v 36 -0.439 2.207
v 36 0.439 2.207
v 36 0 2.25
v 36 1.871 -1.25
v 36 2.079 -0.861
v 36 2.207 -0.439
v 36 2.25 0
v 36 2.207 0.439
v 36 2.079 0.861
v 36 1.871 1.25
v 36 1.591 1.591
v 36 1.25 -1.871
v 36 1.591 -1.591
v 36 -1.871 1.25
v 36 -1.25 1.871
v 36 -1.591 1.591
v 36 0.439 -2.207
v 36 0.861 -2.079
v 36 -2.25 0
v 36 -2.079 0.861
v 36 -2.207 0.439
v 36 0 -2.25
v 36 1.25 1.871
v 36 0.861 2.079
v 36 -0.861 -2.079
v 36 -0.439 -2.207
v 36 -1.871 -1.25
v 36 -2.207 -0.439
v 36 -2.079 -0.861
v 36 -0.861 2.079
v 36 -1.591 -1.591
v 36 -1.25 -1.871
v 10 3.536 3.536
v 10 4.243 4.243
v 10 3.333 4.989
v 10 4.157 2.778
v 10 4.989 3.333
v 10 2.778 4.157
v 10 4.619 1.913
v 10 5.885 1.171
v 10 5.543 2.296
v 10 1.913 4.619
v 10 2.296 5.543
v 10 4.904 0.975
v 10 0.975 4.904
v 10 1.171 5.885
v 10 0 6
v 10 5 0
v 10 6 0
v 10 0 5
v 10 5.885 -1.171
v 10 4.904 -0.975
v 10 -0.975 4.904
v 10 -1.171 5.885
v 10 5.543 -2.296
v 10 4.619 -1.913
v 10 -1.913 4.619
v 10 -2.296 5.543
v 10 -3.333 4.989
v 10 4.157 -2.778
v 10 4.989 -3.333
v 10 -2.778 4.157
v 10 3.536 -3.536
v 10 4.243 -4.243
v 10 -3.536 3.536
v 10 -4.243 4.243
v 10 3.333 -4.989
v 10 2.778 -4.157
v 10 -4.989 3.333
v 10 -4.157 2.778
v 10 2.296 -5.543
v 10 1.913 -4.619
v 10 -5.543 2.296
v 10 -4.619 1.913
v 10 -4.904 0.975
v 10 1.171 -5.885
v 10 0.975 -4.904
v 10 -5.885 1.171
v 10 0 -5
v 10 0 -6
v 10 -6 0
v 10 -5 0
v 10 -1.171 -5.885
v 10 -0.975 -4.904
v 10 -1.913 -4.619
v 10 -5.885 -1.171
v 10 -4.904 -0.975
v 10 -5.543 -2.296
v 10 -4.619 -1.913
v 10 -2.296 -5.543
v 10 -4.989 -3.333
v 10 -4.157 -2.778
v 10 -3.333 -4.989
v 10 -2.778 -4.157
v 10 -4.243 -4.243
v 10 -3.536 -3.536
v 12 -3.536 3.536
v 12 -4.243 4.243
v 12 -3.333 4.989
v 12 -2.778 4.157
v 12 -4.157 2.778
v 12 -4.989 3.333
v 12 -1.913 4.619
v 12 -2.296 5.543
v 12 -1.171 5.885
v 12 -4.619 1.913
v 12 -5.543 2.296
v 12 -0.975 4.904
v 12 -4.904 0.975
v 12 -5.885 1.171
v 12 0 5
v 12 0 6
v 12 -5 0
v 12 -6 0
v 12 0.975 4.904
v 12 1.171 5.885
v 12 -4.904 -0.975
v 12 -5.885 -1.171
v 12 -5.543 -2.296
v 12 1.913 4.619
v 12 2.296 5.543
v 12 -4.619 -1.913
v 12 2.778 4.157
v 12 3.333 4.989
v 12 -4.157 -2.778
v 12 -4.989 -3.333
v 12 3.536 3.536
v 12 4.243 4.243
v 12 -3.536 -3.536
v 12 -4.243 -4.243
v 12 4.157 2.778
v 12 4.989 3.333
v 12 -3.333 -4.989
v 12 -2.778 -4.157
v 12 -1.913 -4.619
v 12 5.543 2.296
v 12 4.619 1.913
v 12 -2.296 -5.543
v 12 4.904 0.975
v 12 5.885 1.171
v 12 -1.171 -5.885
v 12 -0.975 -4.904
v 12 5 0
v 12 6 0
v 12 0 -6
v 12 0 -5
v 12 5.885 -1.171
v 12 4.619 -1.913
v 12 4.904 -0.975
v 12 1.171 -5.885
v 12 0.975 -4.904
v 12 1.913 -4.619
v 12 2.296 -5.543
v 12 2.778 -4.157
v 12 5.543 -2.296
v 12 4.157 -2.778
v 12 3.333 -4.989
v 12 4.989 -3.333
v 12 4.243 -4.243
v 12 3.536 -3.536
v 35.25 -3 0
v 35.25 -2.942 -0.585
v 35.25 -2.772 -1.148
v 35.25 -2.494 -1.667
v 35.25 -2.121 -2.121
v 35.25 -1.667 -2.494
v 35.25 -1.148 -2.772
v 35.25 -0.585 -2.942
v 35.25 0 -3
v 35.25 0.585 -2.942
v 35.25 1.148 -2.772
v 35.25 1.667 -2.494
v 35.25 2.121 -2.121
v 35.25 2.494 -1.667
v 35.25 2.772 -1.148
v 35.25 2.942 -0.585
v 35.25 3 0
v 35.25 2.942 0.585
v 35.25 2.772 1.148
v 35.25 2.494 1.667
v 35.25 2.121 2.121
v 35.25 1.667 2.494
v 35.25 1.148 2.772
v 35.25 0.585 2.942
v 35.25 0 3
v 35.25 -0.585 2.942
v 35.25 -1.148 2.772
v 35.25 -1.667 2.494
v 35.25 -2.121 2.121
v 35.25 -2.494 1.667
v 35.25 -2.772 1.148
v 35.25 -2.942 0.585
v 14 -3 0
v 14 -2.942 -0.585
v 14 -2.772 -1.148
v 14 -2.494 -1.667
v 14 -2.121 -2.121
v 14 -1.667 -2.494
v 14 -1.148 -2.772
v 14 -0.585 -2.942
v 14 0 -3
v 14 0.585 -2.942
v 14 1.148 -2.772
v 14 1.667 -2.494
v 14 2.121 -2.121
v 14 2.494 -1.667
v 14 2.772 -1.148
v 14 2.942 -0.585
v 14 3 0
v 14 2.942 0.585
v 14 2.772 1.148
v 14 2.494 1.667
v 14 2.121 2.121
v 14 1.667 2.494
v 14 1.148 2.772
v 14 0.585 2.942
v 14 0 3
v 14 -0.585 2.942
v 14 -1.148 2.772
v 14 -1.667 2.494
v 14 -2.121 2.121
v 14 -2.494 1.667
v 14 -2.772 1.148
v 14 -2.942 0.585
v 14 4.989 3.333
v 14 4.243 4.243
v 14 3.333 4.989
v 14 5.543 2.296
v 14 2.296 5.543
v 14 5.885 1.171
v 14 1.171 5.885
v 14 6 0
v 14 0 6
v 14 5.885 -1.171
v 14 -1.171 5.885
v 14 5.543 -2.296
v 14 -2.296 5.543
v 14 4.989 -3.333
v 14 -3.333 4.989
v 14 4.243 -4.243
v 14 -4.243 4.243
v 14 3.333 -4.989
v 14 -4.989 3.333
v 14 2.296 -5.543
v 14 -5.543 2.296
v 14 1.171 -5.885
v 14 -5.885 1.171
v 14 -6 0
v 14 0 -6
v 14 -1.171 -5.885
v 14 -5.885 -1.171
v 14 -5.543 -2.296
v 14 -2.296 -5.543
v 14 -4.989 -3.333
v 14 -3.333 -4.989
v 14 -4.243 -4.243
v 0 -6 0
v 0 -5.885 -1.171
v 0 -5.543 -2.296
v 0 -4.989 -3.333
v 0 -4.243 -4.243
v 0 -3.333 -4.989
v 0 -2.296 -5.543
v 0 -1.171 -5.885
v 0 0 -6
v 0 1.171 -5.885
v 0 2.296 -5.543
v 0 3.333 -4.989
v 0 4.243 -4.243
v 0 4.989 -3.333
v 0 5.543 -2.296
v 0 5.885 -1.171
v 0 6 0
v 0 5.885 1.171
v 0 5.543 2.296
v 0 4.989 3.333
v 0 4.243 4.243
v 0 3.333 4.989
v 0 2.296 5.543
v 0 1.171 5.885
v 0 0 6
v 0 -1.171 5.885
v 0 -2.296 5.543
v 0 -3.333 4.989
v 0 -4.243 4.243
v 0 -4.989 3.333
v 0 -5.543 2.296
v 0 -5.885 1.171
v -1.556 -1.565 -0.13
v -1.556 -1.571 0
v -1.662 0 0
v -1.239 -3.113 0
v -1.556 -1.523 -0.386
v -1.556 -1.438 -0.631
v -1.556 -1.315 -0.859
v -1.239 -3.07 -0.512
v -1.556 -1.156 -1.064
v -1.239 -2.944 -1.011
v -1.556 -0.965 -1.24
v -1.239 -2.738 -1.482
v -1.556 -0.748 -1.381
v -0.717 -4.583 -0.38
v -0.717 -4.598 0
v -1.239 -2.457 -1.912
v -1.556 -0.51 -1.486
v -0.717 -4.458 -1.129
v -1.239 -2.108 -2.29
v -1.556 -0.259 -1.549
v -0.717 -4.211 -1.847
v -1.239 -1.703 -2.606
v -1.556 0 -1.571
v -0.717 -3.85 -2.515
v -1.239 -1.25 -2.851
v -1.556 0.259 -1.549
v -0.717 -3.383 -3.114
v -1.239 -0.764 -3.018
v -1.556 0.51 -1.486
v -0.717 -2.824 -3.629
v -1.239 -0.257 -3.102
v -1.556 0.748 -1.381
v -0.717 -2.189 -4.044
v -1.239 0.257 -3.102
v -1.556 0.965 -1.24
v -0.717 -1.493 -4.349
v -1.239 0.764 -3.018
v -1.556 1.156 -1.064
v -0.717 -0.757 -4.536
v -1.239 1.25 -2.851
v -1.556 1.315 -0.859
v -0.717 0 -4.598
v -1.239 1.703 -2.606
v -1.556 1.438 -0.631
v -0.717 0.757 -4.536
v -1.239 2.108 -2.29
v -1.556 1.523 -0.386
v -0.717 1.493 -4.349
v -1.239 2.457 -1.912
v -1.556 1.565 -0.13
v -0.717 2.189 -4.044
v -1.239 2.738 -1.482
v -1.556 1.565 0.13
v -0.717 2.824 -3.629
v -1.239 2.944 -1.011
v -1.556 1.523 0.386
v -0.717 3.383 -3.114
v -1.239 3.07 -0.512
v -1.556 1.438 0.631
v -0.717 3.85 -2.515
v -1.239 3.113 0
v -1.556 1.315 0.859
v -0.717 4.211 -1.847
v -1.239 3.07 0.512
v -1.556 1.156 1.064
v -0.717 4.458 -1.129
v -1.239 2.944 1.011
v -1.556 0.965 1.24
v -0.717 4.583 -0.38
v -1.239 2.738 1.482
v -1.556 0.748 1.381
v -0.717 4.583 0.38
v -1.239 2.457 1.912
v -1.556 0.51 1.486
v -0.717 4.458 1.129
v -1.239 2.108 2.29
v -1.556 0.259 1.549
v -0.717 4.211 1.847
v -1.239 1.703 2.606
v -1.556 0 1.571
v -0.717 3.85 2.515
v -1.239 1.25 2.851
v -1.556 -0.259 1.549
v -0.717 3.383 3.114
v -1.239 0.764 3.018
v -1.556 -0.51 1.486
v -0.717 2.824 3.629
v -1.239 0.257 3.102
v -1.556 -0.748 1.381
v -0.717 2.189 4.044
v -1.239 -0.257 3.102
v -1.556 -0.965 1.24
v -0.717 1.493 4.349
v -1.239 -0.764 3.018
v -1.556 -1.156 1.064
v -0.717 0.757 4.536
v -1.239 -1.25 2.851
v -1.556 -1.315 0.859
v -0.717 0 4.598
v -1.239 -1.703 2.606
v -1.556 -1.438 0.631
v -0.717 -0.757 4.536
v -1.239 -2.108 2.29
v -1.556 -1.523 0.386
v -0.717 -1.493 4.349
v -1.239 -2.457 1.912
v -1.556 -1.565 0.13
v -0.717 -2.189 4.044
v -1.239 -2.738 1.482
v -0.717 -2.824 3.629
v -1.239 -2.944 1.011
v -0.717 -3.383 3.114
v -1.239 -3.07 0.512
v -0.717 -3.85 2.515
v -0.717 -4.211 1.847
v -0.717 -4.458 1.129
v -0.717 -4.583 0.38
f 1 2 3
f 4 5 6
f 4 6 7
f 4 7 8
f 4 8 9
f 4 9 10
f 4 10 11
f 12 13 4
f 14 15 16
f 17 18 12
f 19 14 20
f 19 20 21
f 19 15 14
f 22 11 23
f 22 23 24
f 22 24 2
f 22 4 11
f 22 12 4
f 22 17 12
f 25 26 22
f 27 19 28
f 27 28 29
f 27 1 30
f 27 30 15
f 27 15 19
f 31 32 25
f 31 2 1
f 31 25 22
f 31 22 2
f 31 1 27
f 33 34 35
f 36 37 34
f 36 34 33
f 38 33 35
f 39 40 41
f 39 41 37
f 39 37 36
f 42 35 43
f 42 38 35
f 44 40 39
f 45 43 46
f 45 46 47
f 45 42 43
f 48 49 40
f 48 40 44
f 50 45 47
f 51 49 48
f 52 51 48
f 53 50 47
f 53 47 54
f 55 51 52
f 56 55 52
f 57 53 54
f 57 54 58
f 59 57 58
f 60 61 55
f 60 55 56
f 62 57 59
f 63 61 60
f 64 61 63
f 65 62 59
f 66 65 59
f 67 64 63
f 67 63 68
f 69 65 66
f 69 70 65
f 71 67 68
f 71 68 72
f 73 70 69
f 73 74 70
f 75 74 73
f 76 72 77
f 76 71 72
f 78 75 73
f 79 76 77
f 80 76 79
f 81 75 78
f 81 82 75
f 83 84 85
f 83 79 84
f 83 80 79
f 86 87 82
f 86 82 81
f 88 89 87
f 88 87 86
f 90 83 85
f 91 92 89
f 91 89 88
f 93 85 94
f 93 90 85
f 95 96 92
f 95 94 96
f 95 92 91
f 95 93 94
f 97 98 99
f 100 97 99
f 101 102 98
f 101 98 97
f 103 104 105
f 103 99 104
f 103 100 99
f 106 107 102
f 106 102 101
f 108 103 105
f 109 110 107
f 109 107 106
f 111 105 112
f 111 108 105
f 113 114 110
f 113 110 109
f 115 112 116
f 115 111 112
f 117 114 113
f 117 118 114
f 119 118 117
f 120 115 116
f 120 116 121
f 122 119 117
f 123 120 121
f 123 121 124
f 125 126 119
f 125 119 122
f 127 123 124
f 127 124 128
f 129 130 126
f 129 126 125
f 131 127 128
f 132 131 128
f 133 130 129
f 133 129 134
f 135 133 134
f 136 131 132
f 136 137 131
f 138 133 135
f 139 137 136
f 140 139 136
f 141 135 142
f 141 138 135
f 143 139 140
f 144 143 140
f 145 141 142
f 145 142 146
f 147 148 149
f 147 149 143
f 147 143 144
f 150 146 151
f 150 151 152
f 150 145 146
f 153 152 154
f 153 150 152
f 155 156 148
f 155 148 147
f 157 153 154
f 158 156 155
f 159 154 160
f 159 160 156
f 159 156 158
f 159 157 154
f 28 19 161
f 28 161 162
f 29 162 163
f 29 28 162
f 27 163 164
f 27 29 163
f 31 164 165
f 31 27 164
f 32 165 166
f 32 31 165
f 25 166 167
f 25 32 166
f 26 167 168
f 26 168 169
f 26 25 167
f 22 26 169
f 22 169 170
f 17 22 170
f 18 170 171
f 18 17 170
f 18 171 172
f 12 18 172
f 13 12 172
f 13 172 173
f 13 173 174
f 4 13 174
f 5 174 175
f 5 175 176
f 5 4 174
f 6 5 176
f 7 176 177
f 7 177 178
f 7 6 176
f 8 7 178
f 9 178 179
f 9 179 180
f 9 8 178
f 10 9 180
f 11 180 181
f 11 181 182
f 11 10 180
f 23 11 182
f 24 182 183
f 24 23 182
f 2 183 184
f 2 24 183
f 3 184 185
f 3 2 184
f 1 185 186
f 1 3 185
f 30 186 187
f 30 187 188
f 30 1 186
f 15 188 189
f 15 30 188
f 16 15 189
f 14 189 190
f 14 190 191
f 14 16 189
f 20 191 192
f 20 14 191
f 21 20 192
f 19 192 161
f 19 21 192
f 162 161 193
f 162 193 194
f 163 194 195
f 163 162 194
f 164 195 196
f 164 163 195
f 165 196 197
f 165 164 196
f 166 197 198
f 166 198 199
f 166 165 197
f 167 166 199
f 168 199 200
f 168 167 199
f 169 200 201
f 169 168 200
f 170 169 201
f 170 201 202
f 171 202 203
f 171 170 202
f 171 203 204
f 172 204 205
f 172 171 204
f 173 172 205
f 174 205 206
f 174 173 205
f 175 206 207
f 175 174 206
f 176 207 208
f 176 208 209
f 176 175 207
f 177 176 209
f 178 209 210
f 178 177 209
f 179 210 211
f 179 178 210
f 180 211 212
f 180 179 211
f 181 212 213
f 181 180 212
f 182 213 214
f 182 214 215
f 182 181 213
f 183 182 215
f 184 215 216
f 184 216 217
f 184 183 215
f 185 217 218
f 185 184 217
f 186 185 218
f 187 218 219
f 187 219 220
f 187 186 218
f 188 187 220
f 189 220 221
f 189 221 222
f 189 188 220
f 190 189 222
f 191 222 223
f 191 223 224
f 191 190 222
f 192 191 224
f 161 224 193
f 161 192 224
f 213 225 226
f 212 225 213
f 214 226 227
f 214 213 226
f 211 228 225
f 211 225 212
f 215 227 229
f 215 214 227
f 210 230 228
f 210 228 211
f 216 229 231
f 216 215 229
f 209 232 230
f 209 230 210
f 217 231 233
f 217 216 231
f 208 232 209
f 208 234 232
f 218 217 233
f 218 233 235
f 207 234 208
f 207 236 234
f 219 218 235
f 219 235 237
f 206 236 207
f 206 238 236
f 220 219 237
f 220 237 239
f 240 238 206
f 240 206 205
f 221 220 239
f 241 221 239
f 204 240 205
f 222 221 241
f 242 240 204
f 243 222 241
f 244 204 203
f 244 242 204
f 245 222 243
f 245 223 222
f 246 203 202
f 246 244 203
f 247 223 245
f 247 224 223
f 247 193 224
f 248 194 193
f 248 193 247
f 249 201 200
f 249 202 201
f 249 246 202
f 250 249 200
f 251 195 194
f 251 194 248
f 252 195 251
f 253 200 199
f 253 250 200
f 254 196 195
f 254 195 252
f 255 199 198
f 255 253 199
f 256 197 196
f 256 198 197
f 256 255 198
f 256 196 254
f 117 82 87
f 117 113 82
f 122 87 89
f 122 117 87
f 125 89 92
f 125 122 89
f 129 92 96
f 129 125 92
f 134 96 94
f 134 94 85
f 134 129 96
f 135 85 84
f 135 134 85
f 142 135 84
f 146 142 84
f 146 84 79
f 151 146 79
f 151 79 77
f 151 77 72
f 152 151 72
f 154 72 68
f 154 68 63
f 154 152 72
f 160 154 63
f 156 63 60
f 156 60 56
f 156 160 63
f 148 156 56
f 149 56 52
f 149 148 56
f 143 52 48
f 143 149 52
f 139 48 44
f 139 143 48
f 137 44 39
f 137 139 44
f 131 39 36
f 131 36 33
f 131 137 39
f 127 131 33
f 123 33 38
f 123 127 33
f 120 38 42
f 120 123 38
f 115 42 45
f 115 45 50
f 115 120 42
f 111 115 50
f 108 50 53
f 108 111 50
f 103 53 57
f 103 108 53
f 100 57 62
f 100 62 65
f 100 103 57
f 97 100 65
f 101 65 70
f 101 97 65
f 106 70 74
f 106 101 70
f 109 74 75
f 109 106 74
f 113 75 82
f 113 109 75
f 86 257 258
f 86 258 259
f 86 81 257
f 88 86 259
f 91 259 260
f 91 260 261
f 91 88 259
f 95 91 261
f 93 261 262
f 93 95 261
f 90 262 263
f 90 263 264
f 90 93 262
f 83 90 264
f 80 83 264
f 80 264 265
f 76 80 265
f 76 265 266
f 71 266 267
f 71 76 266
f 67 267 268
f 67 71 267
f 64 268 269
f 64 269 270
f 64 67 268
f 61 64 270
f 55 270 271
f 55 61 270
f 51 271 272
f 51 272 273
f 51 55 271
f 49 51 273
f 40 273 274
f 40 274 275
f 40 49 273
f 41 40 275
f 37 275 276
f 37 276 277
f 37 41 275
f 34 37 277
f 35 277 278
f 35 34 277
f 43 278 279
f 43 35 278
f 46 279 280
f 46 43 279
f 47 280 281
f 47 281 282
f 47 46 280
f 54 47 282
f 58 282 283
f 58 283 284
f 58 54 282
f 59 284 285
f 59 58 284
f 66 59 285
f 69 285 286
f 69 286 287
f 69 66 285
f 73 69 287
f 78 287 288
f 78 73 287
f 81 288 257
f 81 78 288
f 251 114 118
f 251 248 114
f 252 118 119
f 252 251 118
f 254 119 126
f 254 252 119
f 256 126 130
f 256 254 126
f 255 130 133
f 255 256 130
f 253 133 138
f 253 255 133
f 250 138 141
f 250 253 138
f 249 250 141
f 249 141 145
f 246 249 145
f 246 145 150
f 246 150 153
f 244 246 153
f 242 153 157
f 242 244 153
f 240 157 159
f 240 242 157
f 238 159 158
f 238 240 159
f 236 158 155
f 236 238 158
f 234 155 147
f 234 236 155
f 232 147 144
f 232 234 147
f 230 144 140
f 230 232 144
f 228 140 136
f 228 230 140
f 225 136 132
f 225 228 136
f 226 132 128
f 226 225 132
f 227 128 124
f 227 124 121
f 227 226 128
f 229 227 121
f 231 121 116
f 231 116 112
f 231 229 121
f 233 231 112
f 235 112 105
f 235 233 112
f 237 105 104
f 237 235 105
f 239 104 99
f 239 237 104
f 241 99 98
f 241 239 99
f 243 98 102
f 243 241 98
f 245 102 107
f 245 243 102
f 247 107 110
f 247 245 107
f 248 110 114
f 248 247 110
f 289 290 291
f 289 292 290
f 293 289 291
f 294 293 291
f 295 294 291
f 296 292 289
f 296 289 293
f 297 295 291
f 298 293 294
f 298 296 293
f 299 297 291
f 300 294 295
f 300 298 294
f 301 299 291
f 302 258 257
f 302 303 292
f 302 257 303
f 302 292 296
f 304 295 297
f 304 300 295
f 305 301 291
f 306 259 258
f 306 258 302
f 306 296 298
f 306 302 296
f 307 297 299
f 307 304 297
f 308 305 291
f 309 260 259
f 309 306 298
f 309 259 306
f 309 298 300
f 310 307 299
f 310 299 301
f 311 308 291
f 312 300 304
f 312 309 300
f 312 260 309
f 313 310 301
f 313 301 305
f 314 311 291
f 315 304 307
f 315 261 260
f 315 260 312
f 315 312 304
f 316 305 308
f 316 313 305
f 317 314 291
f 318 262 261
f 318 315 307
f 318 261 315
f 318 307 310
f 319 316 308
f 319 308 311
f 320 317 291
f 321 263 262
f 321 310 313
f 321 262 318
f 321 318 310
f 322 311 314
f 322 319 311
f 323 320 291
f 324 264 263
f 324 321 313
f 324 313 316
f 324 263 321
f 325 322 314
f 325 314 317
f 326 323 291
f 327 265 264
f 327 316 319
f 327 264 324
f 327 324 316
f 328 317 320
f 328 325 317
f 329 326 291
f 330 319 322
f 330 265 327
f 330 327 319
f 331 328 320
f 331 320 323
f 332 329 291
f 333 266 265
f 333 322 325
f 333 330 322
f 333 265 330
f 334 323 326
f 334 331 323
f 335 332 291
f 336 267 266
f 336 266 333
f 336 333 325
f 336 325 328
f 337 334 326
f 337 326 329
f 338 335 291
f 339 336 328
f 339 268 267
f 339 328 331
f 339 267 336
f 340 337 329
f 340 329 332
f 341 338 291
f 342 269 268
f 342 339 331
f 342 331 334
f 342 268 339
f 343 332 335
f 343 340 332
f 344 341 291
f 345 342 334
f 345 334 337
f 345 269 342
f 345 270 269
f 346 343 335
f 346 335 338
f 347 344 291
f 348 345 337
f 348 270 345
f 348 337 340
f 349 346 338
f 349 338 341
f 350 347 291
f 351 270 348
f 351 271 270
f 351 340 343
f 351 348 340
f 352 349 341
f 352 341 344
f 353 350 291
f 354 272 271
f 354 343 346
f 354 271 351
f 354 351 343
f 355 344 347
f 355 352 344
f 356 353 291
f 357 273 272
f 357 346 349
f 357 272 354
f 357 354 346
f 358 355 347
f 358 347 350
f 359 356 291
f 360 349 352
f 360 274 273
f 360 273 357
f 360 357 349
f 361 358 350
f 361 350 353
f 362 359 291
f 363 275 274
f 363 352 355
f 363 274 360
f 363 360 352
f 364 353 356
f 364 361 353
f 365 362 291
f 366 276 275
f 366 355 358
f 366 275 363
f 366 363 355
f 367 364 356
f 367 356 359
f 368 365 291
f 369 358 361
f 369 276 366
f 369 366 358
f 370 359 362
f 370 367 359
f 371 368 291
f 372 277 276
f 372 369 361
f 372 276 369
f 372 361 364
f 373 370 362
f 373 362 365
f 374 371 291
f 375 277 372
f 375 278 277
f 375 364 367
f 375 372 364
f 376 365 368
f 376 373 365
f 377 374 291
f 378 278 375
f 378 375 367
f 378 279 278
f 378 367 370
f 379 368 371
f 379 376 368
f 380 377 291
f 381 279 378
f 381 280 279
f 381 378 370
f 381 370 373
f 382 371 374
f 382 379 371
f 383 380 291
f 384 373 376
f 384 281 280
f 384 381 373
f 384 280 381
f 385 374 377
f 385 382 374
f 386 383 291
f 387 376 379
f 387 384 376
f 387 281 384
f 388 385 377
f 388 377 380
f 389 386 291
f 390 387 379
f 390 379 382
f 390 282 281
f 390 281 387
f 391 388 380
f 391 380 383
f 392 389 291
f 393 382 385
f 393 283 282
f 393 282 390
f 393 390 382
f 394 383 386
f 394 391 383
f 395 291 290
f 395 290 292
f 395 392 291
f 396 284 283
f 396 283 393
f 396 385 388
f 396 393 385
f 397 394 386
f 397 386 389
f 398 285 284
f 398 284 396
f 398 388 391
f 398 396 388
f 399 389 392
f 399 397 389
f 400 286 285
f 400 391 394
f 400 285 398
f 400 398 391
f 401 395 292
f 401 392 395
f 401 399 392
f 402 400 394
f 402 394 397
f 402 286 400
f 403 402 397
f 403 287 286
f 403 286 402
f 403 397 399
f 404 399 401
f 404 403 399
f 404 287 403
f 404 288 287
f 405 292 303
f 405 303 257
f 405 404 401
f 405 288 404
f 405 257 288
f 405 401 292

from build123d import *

# Parameters (mm, degrees)
CHANFREIN1_SIZE = 0.75


with BuildPart() as part:
    # Esquisse1 → Base-Révolution (revolve)
    with BuildSketch(Plane.XY, mode=Mode.PRIVATE) as base_r_volution_sk:
        with BuildLine():
            Line((0, 6), (10, 6))
            Line((10, 6), (10, 5))
            Line((10, 5), (12, 5))
            Line((12, 5), (12, 6))
            Line((12, 6), (14, 6))
            Line((14, 6), (14, 3))
            Line((14, 3), (36, 3))
            Line((36, 3), (36, 0))
            Line((36, 0), (-1.66190379, 0))
            ThreePointArc((-1.66190379, 0), (-1.238750773, 3.11295375), (0, 6))
        make_face()
    revolve(base_r_volution_sk.sketch.rotate(Axis((-3, 0, 0), (1, 0, 0)), 180), axis=Axis((-3, 0, 0), (1, 0, 0)))

    # Chanfrein1
    chanfrein1_edges = [part.edges().sort_by_distance(p)[0] for p in [
        (36, 3, 0),
    ]]
    chamfer(chanfrein1_edges, length=CHANFREIN1_SIZE)


solid = part.part
